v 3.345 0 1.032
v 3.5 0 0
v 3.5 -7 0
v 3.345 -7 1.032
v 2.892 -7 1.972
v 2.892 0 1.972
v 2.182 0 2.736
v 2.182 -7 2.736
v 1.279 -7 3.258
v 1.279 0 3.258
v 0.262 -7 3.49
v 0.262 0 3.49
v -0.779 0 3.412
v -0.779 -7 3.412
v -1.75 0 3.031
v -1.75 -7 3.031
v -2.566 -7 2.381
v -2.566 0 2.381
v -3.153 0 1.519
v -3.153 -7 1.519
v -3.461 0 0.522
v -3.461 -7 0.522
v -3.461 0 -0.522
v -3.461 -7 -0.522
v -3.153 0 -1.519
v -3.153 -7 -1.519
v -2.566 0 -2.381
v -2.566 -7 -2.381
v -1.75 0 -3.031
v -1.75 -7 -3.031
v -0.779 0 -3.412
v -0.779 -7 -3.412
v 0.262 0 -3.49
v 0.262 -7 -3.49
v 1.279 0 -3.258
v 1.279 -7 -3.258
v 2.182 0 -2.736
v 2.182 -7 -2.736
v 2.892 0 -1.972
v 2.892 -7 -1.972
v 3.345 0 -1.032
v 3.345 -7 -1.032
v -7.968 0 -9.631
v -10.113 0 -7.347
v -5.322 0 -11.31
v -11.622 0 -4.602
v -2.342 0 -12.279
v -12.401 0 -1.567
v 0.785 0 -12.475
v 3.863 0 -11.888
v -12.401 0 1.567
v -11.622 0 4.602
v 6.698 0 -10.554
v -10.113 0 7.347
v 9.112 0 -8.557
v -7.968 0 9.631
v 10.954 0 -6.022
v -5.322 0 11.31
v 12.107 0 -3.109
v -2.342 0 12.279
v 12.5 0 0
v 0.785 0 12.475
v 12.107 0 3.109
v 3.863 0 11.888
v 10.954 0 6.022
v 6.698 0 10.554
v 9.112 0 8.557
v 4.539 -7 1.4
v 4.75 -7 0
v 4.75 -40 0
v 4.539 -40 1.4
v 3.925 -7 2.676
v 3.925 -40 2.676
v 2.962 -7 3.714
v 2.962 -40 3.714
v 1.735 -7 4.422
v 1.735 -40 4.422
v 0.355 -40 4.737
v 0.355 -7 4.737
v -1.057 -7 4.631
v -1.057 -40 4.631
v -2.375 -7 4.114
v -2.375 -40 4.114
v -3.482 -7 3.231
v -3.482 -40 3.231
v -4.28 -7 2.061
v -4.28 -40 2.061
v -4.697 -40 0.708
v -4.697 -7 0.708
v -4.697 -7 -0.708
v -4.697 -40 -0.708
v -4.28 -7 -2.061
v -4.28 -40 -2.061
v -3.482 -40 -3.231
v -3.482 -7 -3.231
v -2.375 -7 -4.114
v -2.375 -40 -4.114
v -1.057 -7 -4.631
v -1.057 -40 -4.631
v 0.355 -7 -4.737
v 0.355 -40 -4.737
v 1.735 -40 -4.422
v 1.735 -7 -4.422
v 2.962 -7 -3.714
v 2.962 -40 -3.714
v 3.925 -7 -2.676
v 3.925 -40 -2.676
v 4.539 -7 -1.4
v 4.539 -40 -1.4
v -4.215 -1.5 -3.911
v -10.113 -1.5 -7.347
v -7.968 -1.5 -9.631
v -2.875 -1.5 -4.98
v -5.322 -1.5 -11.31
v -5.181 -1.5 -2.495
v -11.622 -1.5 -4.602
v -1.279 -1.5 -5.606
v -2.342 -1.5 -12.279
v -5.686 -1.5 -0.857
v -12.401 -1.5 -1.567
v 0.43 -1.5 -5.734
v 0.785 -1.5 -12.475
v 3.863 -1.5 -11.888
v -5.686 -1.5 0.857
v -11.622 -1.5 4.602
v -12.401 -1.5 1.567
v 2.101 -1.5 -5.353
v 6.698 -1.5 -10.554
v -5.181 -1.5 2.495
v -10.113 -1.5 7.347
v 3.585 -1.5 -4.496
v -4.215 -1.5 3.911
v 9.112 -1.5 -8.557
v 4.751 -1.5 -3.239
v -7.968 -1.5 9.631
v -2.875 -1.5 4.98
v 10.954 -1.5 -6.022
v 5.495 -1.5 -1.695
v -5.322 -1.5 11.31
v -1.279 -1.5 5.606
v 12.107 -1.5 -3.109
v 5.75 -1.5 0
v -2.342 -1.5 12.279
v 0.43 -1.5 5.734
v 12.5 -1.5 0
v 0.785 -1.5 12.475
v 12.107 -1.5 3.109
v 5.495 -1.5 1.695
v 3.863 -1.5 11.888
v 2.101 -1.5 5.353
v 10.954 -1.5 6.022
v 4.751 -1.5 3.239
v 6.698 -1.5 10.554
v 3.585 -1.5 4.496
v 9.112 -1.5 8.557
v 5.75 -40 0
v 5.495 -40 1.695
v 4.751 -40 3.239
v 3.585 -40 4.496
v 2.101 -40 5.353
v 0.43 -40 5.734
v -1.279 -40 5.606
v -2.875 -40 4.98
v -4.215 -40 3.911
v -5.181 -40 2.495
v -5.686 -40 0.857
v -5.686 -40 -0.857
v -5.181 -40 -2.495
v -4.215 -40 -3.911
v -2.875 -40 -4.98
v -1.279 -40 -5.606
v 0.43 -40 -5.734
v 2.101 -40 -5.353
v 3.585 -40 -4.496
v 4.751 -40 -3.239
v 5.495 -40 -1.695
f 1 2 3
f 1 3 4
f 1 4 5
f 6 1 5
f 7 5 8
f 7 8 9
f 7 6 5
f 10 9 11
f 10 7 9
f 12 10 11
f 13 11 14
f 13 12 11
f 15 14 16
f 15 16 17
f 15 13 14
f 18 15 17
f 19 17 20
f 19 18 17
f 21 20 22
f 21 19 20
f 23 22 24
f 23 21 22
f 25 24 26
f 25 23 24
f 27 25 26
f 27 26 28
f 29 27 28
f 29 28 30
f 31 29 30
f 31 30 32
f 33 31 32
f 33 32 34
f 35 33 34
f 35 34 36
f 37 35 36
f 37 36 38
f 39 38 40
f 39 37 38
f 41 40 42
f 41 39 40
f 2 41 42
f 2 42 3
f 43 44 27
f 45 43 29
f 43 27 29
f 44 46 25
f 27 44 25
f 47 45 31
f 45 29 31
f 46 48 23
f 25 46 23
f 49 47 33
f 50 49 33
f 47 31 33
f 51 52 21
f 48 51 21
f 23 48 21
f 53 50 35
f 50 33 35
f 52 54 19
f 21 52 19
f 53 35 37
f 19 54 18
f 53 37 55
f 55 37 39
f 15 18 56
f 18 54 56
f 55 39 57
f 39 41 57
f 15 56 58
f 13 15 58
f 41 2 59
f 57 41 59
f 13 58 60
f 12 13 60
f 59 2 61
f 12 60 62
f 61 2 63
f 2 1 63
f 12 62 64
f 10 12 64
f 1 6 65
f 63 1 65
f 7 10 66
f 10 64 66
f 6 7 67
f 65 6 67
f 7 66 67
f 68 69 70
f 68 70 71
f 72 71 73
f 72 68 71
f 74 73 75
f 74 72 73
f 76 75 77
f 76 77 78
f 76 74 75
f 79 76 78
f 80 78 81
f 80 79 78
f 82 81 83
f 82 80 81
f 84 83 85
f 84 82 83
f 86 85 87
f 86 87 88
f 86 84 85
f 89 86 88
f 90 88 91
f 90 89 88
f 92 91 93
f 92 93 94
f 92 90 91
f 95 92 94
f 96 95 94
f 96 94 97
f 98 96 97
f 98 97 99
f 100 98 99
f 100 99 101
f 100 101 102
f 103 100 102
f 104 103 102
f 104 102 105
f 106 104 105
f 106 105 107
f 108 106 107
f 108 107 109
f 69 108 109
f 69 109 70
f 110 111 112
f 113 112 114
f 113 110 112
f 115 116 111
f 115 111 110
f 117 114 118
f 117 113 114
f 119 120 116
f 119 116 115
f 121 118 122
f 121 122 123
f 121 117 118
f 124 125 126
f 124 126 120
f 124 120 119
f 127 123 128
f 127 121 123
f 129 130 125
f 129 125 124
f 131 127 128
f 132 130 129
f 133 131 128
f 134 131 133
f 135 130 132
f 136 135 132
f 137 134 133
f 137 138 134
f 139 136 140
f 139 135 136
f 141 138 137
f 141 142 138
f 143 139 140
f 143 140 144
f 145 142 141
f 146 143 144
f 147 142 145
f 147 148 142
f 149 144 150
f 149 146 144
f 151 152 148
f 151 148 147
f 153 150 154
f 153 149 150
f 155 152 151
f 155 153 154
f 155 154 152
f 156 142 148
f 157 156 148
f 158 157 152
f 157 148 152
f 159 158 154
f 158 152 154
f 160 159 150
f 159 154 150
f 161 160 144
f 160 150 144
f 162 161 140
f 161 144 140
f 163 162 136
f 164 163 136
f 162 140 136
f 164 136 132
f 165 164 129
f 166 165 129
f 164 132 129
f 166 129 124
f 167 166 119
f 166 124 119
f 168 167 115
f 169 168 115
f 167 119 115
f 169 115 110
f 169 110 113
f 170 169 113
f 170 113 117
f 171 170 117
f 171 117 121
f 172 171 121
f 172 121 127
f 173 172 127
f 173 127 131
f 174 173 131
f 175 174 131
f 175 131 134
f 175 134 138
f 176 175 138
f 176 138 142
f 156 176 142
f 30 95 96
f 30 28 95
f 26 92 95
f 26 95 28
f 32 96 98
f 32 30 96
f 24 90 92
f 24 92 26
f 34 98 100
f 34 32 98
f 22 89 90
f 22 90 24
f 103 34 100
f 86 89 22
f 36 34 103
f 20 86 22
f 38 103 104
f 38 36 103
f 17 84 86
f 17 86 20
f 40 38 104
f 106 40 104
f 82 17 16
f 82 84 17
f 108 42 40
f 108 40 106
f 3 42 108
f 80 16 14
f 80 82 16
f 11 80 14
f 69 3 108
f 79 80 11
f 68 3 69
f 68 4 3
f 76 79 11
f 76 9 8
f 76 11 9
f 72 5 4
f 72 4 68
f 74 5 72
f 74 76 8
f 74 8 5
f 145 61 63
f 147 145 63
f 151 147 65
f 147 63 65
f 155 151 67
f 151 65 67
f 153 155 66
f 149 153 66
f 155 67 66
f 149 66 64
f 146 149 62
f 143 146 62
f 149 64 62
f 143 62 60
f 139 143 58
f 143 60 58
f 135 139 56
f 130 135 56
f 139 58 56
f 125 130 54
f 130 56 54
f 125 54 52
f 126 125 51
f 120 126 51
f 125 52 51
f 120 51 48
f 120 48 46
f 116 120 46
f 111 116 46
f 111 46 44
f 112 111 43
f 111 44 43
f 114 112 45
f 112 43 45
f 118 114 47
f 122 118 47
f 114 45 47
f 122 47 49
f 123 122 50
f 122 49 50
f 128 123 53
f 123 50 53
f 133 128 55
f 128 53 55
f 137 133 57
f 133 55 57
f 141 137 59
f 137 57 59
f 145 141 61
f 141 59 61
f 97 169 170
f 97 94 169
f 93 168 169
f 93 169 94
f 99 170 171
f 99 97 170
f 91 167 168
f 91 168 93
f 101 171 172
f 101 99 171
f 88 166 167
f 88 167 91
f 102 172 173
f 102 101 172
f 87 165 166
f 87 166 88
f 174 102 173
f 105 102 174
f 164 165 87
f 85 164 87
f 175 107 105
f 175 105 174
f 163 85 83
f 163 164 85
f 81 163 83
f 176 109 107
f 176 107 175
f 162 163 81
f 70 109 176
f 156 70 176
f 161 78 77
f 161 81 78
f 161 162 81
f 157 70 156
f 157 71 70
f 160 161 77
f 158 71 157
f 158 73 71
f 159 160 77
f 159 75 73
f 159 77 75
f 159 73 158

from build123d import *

# Parameters (mm, degrees)
F0_R     = 5.75
F0_R_2   = 4.75
F0_R_3   = 12.5
F1_DEPTH = 1.5
F2_DEPTH = 40
F0_R_4   = 3.5
F3_DEPTH = 7


with BuildPart() as f1:
    # F0 (on Front) → F1 (new body)
    with BuildSketch(Plane.XZ):
        Circle(F0_R)
        Circle(F0_R_2, mode=Mode.SUBTRACT)
        Circle(F0_R_3)
        Circle(F0_R, mode=Mode.SUBTRACT)
    extrude(amount=F1_DEPTH)

    # F0 (on Front) → F2 (join)
    with BuildSketch(Plane.XZ):
        Circle(F0_R)
        Circle(F0_R_2, mode=Mode.SUBTRACT)
    extrude(amount=F2_DEPTH)

    # F0 (on Front) → F3 (join)
    with BuildSketch(Plane.XZ):
        Circle(F0_R_2)
        Circle(F0_R_4, mode=Mode.SUBTRACT)
    extrude(amount=F3_DEPTH)


solid = f1.part
